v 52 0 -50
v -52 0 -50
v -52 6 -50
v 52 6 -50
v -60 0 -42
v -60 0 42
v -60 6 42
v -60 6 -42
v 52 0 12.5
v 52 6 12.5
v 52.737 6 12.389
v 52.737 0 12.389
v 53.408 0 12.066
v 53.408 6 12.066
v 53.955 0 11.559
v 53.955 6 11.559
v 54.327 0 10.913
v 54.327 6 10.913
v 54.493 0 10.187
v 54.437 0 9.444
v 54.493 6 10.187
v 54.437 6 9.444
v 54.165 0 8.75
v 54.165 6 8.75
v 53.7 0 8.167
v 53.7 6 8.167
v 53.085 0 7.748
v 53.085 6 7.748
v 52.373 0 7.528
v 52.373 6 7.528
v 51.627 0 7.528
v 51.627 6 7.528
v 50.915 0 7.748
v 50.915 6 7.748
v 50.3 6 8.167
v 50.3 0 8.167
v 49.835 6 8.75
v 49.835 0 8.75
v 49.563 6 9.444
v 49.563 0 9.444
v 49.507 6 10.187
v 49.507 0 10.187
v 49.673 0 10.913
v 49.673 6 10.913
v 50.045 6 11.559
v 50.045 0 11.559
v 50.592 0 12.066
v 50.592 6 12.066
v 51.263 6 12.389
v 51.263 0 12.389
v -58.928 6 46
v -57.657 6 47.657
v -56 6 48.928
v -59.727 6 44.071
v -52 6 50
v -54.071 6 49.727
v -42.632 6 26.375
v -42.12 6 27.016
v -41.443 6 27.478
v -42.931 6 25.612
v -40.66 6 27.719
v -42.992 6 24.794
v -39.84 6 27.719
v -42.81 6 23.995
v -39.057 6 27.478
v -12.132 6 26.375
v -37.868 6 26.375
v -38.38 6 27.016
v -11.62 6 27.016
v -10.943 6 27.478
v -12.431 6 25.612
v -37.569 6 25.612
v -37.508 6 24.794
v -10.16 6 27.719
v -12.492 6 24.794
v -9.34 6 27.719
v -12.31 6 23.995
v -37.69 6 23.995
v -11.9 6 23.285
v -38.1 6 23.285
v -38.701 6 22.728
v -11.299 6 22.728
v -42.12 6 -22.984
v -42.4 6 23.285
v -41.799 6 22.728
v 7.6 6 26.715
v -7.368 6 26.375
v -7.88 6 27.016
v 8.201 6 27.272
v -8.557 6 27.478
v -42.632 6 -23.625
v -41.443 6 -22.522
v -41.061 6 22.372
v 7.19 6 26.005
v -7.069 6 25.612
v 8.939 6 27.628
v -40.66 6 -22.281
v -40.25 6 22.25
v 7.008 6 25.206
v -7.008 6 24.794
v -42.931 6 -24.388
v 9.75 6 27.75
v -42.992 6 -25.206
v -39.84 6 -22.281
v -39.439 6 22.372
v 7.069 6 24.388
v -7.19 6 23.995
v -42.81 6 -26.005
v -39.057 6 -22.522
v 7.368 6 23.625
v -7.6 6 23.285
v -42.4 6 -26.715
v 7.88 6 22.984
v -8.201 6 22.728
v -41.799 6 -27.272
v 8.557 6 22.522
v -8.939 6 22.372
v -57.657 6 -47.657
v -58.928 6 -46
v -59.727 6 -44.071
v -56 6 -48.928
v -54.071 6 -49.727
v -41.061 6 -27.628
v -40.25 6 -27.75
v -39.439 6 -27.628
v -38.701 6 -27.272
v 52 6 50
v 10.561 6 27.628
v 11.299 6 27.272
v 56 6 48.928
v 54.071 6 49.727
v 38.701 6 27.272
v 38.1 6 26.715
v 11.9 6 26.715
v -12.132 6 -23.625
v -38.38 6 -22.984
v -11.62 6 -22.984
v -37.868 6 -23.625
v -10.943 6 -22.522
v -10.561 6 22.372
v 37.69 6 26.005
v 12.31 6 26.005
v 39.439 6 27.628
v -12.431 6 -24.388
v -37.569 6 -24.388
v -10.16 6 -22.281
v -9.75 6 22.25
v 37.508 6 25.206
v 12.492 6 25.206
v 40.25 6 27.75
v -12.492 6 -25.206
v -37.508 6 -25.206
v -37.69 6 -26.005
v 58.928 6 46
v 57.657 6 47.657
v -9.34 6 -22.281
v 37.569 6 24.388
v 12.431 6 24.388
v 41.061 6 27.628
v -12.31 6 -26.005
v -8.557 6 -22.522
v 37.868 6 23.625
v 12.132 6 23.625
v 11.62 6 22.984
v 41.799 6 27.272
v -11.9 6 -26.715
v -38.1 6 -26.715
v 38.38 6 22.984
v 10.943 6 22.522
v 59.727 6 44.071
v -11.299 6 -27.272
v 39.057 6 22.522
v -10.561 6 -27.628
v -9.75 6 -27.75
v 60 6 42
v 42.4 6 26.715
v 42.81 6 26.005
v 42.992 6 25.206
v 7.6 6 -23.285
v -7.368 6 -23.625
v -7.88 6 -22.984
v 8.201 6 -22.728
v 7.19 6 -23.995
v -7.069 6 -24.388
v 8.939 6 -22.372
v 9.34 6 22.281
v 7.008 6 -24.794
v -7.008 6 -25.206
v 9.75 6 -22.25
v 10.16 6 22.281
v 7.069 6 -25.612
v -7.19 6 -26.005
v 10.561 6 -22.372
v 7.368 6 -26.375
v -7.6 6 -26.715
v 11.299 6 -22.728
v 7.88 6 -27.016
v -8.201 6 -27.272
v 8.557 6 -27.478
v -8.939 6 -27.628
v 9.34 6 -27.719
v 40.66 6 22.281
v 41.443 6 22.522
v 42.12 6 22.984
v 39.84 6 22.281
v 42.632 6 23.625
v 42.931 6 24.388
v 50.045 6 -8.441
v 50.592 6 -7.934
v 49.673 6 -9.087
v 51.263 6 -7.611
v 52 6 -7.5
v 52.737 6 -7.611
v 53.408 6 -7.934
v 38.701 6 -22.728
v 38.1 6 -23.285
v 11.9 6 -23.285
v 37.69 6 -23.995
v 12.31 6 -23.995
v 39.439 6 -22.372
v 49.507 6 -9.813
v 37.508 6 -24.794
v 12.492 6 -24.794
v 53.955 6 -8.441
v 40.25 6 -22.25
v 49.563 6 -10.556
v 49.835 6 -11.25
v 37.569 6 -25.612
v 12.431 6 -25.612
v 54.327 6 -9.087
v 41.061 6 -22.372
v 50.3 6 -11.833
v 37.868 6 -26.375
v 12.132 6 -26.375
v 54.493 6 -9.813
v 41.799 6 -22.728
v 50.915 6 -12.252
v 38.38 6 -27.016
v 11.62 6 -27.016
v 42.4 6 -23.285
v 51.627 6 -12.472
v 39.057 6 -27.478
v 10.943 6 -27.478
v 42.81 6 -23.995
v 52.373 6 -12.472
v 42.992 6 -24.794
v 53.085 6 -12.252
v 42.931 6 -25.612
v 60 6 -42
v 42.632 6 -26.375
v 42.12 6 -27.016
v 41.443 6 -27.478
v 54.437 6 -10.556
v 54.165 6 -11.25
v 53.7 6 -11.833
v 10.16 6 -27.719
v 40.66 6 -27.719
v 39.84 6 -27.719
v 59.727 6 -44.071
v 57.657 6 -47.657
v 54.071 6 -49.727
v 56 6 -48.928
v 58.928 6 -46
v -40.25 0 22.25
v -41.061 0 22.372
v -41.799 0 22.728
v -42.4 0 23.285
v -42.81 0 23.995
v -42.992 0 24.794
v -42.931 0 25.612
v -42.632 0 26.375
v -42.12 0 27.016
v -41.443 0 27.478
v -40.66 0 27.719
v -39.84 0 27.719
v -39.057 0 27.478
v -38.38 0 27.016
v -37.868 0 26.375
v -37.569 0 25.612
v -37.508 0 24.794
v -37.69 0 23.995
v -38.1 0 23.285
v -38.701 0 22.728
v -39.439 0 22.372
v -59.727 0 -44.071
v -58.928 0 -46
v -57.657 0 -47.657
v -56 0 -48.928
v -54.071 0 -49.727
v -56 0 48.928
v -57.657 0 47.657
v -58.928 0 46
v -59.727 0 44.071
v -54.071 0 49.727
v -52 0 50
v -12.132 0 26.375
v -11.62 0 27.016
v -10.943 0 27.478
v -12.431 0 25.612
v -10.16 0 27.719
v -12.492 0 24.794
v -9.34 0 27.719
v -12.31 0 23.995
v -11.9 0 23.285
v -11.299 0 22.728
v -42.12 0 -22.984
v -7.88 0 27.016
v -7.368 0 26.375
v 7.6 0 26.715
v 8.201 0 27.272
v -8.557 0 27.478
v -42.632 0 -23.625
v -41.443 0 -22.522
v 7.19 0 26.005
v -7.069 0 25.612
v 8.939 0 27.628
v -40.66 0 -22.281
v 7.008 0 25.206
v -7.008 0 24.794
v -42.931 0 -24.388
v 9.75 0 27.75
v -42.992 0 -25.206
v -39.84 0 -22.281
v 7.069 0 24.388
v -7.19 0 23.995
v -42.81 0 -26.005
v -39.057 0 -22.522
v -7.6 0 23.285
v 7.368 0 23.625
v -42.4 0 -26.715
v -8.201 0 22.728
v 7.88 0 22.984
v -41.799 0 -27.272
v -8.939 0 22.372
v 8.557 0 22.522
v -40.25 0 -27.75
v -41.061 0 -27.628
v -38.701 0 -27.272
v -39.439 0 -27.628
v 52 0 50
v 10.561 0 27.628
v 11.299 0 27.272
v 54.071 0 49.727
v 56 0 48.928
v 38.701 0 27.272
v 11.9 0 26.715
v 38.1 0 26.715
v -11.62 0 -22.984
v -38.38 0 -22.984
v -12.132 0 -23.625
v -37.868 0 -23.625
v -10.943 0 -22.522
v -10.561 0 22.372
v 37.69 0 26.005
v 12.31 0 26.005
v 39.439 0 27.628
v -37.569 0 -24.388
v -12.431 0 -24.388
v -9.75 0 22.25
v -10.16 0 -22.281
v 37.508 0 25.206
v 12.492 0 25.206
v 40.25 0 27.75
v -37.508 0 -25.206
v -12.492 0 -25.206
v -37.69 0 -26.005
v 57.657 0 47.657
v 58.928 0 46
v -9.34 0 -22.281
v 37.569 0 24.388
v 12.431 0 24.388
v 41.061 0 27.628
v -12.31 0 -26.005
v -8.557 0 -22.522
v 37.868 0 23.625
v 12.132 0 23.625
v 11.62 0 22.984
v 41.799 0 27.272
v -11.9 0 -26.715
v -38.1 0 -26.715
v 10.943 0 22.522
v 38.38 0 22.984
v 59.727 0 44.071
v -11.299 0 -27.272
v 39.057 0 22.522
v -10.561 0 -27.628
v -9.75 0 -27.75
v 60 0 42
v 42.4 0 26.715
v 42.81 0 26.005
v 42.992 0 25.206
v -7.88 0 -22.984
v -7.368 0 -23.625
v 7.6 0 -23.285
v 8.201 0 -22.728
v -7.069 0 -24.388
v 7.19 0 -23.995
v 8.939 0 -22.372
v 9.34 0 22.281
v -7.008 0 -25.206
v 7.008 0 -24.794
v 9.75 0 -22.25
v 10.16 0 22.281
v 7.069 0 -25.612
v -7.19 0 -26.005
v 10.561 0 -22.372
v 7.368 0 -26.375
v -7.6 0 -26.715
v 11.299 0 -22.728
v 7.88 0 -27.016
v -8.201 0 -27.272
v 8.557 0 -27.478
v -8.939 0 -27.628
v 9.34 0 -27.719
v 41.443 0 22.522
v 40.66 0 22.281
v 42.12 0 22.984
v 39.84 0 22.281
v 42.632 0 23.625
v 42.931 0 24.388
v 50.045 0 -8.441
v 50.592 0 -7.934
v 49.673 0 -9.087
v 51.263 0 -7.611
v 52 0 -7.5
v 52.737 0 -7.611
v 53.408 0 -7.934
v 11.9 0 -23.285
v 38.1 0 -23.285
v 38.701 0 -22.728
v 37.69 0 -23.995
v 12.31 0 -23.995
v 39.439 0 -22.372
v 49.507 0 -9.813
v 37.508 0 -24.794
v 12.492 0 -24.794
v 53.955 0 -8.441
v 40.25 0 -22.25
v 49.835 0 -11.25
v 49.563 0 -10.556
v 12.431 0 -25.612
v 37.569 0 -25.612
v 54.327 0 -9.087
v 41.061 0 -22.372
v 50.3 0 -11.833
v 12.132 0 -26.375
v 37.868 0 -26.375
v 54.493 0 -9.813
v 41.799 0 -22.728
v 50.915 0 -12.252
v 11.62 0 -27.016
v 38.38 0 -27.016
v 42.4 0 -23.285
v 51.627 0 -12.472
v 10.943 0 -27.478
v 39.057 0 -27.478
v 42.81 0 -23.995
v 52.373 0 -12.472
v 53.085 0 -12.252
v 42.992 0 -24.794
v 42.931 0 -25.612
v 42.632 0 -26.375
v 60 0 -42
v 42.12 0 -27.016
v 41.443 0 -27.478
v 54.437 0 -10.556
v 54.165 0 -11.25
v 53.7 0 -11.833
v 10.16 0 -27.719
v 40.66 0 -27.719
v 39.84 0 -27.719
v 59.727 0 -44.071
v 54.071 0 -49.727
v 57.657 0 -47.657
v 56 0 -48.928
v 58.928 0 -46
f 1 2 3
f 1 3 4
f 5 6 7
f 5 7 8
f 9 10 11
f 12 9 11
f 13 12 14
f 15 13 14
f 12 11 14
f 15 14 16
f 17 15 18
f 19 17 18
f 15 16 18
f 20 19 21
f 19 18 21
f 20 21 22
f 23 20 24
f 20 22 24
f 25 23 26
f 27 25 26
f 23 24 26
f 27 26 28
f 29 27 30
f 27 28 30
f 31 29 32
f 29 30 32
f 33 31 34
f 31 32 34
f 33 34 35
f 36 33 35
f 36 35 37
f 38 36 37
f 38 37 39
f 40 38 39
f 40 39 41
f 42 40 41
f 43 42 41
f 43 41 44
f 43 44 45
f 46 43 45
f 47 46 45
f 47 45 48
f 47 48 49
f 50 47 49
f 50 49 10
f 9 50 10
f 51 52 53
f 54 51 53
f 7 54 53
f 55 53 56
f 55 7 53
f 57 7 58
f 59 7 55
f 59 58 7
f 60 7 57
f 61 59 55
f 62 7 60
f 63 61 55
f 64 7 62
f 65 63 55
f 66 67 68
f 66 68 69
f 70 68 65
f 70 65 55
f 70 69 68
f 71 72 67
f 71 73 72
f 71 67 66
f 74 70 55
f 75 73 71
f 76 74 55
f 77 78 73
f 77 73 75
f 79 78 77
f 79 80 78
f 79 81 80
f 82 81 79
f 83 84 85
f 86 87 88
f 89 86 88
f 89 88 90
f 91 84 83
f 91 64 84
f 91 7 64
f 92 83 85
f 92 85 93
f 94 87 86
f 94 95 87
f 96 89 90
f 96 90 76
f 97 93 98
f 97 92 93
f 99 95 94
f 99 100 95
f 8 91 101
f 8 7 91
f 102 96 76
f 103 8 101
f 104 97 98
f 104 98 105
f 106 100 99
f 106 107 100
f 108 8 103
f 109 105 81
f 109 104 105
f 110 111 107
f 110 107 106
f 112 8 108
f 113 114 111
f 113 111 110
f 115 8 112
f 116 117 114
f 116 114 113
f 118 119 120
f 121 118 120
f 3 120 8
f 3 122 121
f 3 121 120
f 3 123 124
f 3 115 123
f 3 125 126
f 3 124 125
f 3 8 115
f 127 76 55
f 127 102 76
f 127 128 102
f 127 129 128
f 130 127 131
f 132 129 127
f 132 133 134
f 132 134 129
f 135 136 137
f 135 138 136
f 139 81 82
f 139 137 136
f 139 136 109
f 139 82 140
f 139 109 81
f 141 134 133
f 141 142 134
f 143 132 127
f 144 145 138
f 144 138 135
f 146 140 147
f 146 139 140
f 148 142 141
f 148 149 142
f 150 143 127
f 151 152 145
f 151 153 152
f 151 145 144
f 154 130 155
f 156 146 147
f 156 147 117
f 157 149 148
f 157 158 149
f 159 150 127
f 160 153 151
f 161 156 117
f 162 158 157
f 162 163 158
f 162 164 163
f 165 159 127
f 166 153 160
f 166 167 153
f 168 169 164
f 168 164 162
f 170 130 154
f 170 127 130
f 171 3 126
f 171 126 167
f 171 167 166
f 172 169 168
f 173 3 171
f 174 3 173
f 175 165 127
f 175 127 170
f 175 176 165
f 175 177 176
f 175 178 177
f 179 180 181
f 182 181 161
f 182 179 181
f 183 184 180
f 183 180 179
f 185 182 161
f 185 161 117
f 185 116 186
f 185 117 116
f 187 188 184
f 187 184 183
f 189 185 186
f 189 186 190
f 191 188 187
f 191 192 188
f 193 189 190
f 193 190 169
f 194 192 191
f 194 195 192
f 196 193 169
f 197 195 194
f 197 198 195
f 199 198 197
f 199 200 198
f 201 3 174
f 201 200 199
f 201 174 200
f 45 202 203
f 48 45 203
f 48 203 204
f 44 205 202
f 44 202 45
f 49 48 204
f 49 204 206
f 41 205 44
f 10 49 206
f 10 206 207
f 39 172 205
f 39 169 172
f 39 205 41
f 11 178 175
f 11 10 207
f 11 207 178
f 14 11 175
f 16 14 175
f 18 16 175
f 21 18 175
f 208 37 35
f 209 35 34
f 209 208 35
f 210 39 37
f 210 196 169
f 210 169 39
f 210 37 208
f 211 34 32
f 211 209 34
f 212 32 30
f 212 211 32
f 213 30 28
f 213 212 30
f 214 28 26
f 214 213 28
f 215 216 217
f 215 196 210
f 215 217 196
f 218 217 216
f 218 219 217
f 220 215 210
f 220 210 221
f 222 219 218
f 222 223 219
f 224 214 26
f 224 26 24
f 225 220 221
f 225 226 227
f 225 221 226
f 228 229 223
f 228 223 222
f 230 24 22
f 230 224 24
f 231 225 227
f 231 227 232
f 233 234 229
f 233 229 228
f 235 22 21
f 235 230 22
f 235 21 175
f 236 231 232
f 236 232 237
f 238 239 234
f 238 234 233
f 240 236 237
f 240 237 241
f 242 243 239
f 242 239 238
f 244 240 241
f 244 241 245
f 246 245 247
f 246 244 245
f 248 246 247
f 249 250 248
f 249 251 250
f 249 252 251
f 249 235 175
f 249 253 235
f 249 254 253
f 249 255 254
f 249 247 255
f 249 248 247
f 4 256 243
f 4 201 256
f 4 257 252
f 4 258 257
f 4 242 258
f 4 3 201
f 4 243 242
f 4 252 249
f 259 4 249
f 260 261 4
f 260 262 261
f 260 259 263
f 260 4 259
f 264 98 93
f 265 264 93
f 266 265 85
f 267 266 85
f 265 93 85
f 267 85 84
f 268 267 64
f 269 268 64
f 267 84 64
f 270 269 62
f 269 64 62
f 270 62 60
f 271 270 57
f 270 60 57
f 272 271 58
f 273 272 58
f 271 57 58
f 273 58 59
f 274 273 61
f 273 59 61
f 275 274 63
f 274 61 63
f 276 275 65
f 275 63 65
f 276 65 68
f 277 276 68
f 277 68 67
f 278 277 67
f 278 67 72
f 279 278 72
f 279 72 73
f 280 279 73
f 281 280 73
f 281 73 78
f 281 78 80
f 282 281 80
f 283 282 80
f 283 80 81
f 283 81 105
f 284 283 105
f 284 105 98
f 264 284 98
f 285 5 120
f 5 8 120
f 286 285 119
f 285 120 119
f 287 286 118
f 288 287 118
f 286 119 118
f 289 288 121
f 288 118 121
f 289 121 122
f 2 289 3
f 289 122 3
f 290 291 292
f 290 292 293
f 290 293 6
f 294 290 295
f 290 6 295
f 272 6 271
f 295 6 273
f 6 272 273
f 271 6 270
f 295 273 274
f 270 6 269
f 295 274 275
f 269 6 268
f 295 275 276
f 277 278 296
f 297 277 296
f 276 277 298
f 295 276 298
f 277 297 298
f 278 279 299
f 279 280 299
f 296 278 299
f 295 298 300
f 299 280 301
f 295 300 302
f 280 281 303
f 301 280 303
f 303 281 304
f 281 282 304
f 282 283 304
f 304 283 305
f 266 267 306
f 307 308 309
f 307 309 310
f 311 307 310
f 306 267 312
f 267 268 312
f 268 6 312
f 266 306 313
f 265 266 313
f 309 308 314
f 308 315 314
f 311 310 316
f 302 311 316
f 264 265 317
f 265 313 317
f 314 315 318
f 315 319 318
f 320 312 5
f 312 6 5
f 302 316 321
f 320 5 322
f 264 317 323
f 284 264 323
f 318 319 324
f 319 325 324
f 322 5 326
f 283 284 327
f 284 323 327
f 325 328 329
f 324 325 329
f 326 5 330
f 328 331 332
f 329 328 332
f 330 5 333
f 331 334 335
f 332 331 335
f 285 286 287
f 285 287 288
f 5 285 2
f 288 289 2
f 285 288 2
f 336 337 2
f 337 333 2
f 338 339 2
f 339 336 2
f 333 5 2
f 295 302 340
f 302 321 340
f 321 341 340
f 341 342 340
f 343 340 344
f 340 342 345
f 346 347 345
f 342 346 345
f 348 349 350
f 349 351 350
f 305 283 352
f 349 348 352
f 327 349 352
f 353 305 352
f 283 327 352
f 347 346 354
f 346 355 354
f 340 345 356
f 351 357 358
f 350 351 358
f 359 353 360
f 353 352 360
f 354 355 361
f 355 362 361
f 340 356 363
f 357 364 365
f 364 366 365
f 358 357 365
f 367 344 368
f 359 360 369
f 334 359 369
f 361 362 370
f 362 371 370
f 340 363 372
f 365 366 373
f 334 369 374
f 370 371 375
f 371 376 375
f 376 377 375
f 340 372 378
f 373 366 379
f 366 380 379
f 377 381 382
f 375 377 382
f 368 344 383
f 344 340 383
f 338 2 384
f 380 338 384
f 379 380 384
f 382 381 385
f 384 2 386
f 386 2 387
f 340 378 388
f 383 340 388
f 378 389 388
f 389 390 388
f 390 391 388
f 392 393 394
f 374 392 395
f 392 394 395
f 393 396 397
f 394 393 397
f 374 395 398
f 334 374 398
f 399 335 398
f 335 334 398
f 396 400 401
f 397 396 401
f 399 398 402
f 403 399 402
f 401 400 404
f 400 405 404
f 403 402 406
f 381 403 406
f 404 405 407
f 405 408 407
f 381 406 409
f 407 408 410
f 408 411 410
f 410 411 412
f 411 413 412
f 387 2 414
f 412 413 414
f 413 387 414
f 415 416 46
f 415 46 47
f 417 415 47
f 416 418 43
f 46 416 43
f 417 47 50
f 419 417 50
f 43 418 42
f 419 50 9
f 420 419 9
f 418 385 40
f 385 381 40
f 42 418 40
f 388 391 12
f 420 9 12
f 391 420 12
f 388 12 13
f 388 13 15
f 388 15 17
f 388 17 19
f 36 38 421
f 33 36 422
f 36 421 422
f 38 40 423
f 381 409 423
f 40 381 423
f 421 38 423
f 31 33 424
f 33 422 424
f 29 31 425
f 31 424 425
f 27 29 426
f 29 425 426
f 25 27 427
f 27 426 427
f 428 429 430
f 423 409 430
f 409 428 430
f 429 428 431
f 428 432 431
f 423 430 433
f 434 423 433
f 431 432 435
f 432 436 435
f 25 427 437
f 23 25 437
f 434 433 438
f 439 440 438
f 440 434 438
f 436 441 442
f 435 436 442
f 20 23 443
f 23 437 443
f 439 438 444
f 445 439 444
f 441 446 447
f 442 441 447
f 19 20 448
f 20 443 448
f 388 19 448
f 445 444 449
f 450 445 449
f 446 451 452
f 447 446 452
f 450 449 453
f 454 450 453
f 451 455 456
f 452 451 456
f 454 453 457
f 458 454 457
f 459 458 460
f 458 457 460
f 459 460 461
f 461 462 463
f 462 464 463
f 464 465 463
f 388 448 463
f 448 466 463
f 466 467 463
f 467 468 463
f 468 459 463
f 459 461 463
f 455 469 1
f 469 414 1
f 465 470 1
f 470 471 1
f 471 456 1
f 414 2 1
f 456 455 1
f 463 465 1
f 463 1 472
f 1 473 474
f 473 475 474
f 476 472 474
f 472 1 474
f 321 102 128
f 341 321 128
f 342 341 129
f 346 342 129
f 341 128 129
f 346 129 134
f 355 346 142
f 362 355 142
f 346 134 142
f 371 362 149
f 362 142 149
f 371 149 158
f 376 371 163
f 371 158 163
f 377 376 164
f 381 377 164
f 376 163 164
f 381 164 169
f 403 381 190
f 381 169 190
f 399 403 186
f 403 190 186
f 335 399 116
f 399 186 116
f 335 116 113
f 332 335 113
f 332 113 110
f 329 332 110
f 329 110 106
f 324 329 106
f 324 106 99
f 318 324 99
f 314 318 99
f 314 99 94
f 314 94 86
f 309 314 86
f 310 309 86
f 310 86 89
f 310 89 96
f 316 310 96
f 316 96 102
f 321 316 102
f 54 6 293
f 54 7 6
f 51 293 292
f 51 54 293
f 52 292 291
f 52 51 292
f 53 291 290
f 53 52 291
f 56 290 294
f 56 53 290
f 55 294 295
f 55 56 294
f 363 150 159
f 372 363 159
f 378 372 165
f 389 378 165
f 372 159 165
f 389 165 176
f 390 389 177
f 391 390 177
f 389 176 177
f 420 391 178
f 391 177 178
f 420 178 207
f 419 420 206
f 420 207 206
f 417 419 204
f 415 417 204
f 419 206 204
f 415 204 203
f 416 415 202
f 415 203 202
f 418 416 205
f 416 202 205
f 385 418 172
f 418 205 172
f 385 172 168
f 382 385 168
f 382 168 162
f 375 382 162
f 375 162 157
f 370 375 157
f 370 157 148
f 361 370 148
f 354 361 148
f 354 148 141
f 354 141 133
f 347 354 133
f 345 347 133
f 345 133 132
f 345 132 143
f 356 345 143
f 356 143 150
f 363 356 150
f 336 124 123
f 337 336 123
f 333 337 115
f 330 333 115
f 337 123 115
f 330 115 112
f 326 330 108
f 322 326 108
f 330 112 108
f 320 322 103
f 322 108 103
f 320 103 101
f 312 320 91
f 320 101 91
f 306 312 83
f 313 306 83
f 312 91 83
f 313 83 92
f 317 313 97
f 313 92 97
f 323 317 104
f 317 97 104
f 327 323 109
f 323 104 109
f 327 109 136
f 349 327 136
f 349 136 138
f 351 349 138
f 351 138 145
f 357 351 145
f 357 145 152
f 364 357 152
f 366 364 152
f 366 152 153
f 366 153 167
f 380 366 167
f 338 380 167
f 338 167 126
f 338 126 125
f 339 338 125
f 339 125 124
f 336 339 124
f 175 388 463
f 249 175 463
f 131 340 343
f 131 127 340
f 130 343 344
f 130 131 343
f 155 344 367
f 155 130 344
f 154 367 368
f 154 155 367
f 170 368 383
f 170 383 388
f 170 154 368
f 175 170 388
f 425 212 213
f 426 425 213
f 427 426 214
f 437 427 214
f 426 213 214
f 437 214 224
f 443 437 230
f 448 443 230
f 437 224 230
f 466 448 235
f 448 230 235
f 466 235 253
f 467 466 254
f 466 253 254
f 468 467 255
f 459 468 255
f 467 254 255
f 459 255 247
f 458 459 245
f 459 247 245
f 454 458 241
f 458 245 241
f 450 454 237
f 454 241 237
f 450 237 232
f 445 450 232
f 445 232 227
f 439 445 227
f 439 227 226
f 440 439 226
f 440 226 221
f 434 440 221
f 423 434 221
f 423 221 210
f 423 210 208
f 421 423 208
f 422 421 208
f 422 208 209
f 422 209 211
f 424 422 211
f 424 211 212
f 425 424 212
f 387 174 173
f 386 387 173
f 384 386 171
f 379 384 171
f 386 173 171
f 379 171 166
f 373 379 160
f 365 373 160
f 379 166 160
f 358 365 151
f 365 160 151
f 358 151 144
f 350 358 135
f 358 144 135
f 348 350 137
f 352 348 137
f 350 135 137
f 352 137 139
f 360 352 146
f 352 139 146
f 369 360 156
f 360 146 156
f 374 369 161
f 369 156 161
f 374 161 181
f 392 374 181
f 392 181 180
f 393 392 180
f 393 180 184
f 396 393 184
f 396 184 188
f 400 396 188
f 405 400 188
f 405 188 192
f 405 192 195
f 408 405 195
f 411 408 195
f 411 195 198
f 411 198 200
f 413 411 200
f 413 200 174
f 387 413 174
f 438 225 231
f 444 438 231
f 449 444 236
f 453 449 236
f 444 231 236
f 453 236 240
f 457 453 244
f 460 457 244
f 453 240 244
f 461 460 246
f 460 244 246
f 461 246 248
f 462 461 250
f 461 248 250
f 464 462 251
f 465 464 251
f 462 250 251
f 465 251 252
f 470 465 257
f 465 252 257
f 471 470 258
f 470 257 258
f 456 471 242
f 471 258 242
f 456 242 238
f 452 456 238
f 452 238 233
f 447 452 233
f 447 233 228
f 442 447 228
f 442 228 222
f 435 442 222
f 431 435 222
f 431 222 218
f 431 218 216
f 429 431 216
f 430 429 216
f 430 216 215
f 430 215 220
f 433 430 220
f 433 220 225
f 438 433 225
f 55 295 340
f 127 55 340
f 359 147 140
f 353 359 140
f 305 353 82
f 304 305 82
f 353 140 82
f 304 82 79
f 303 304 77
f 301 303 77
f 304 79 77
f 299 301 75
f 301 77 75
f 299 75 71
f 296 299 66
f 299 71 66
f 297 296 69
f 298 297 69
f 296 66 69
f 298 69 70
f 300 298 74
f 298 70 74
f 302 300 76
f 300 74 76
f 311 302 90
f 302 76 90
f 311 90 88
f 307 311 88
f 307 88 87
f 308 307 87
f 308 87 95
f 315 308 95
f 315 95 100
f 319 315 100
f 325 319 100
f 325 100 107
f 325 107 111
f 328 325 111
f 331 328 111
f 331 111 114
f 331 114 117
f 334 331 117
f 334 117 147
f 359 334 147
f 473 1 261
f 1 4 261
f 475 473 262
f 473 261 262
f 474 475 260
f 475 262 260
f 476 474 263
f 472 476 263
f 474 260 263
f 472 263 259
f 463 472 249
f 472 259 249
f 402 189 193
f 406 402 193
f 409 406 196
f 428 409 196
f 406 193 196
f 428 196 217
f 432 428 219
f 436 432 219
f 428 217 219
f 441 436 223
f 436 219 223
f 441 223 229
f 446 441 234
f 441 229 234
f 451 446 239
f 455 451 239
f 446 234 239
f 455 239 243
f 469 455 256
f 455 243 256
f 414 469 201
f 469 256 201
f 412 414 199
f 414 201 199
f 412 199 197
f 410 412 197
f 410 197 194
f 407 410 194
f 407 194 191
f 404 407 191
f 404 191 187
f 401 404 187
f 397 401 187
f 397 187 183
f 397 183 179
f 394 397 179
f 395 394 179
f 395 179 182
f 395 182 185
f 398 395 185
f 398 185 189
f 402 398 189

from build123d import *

# Parameters (mm, degrees)
ESBO_O1_W                = 120
ESBO_O1_H                = 100
RESSALTO_EXTRUS_O1_DEPTH = 6
ESBO_O2_R                = 2.75
CORTE_EXTRUS_O1_DEPTH    = 79.33262411
FILETE1_R                = 8
ESBO_O3_R                = 2.5
CORTE_EXTRUS_O2_DEPTH    = 79.33262411


with BuildPart() as part:
    # Esboço1 → Ressalto-extrusão1 (new body)
    with BuildSketch(Plane(origin=(0, 0, 0), x_dir=(1, 0, 0), z_dir=(0, 1, 0))):
        Rectangle(ESBO_O1_W, ESBO_O1_H)
    extrude(amount=RESSALTO_EXTRUS_O1_DEPTH)

    # Esboço2 → Corte-extrusão1 (cut, through all)
    with BuildSketch(Plane(origin=(0, 6, 0), x_dir=(1, 0, 0), z_dir=(0, 1, 0))):
        with Locations(Location((9.75, 25, 0), (0, 0, 270))):
            Circle(ESBO_O2_R)
        with Locations(Location((40.25, 25, 0), (0, 0, 270))):
            Circle(ESBO_O2_R)
        with Locations(Location((9.75, -25, 0), (0, 0, 270))):
            Circle(ESBO_O2_R)
        with Locations(Location((40.25, -25, 0), (0, 0, 270))):
            Circle(ESBO_O2_R)
        with Locations(Location((-40.25, -25, 0), (0, 0, 90))):
            Circle(ESBO_O2_R)
        with Locations(Location((-9.75, -25, 0), (0, 0, 90))):
            Circle(ESBO_O2_R)
        with Locations(Location((-40.25, 25, 0), (0, 0, 90))):
            Circle(ESBO_O2_R)
        with Locations(Location((-9.75, 25, 0), (0, 0, 90))):
            Circle(ESBO_O2_R)
    extrude(amount=-CORTE_EXTRUS_O1_DEPTH, mode=Mode.SUBTRACT)

    # Filete1
    filete1_edges = [part.edges().sort_by_distance(p)[0] for p in [
        (60, 3, 50),
        (-60, 3, 50),
        (-60, 3, -50),
        (60, 3, -50),
    ]]
    fillet(filete1_edges, radius=FILETE1_R)

    # Esboço3 → Corte-extrusão2 (cut, through all)
    with BuildSketch(Plane(origin=(0, 6, 0), x_dir=(1, 0, 0), z_dir=(0, 1, 0))):
        with Locations(Location((52, 10, 0), (0, 0, 270))):
            Circle(ESBO_O3_R)
        with Locations(Location((52, -10, 0), (0, 0, 270))):
            Circle(ESBO_O3_R)
    extrude(amount=-CORTE_EXTRUS_O2_DEPTH, mode=Mode.SUBTRACT)


solid = part.part
